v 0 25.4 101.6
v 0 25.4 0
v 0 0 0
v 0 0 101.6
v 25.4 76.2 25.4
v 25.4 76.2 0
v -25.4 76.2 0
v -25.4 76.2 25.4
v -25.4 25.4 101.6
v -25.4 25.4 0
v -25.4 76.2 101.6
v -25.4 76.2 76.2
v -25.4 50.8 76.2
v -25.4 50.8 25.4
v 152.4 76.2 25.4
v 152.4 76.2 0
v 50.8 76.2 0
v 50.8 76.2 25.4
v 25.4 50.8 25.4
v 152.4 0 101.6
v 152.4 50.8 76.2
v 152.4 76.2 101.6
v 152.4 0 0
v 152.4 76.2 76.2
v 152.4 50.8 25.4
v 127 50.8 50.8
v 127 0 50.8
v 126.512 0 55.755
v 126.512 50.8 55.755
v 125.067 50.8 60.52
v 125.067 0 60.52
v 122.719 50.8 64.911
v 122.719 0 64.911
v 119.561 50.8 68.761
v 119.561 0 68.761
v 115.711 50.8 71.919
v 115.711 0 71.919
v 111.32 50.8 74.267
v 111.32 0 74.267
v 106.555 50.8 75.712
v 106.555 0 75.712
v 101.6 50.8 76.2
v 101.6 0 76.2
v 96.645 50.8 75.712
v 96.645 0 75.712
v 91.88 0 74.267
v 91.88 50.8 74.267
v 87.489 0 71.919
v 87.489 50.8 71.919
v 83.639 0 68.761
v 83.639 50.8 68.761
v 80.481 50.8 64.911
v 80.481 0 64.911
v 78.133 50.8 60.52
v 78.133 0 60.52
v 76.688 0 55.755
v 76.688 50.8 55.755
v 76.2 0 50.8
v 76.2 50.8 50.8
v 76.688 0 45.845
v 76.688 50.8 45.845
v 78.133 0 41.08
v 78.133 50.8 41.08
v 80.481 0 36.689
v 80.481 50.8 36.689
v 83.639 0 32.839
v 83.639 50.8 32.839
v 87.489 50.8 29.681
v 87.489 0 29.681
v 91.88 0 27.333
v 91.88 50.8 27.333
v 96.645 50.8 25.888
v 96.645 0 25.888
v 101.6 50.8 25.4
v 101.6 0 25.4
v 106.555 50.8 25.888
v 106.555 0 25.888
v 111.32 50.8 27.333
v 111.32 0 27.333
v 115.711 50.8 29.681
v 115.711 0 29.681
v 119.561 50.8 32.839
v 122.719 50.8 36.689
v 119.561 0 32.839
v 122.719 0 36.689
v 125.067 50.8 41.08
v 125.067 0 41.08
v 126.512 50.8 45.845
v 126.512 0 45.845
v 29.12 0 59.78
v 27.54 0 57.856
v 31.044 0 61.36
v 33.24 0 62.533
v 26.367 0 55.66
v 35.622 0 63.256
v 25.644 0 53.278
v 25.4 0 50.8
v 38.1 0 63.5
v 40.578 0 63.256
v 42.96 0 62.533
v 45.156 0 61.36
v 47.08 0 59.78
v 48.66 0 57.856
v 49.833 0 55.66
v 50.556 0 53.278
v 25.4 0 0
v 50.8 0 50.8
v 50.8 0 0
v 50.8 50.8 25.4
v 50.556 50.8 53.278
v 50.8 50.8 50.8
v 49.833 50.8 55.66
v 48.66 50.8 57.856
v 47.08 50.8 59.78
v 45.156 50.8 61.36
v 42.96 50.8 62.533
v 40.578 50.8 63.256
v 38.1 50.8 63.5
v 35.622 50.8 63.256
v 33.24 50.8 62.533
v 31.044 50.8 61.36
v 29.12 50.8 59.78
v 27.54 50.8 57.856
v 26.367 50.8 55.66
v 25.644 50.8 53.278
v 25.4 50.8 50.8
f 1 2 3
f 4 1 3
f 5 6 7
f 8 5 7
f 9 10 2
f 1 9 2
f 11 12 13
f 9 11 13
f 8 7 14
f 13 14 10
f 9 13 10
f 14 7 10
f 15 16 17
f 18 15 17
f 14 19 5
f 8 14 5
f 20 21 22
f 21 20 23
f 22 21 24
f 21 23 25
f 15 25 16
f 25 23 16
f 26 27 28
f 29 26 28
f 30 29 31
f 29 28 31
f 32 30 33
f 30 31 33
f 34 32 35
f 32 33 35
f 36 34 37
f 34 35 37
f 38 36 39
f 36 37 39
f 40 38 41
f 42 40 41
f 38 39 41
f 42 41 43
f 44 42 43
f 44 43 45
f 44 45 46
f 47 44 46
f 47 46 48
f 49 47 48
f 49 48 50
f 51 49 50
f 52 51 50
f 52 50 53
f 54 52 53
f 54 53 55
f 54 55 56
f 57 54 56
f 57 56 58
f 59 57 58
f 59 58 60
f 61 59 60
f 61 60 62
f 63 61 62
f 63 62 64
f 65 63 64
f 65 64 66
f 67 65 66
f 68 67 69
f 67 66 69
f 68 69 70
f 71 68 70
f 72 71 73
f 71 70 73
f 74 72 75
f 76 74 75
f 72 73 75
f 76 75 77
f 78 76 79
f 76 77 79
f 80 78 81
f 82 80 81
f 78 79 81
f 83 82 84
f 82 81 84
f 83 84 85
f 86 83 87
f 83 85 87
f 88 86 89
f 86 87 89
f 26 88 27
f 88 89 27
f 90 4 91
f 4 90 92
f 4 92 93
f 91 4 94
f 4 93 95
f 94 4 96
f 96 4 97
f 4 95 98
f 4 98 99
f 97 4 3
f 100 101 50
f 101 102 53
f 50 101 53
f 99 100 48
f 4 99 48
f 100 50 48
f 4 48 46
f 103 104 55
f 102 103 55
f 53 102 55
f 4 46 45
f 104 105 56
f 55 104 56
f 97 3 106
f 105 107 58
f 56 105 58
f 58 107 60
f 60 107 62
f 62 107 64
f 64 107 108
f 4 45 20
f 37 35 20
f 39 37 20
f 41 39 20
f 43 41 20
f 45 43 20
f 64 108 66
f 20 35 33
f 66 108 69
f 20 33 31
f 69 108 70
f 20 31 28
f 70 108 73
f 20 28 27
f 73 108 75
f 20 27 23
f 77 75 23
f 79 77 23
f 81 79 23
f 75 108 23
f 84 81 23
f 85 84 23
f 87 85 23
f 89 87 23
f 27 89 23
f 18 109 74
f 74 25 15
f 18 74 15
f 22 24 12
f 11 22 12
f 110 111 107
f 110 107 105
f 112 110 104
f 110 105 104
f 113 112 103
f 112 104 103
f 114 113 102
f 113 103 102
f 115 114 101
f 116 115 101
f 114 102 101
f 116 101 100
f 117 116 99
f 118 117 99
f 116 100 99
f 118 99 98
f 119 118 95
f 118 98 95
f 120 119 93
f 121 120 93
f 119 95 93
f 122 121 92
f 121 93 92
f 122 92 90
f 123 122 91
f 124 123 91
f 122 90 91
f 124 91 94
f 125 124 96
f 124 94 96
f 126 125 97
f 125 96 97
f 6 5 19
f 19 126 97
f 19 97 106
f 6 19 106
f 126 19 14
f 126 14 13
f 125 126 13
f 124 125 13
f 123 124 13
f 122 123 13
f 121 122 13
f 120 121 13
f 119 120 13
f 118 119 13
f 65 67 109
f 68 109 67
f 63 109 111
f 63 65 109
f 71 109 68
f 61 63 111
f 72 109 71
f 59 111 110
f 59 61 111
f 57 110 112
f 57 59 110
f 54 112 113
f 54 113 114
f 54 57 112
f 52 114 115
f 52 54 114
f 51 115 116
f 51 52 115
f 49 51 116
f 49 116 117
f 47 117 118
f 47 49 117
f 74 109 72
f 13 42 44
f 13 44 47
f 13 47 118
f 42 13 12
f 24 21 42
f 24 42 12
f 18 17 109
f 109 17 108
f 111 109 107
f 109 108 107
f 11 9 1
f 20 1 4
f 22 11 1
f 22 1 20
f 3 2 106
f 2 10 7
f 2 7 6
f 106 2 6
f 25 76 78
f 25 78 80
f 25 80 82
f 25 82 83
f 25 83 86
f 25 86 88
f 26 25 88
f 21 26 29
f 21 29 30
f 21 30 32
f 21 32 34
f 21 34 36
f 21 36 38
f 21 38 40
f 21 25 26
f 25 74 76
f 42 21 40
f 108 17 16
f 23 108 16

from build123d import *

# Parameters (mm, degrees)
F1_DEPTH = 101.6
F2_R     = 25.4
F3_DEPTH = 76.201
F4_W     = 25.4
F4_H     = 50.8
F5_DEPTH = 177.801


with BuildPart() as f1:
    # F0 (on Top) → F1 (new body)
    with BuildSketch(Plane.XY):
        Polygon((0, 25.4), (0, 0), (152.4, 0), (152.4, 76.2), (-25.4, 76.2), (-25.4, 25.4), align=None)
    extrude(amount=F1_DEPTH)

    # F2 (on face) → F3 (cut, through all)
    with BuildSketch(Plane.XZ):
        with BuildLine():
            Line((25.4, 50.8), (25.4, 0))
            Line((25.4, 0), (50.8, 0))
            Line((50.8, 0), (50.8, 50.8))
            ThreePointArc((50.8, 50.8), (38.1, 63.5), (25.4, 50.8))
        make_face()
        with Locations((101.6, 50.8)):
            Circle(F2_R)
    extrude(amount=-F3_DEPTH, mode=Mode.SUBTRACT)

    # F4 (on face) → F5 (cut, through all)
    with BuildSketch(Plane.YZ.offset(152.4)):
        with Locations((63.5, 50.8)):
            Rectangle(F4_W, F4_H)
    extrude(amount=-F5_DEPTH, mode=Mode.SUBTRACT)


solid = f1.part
